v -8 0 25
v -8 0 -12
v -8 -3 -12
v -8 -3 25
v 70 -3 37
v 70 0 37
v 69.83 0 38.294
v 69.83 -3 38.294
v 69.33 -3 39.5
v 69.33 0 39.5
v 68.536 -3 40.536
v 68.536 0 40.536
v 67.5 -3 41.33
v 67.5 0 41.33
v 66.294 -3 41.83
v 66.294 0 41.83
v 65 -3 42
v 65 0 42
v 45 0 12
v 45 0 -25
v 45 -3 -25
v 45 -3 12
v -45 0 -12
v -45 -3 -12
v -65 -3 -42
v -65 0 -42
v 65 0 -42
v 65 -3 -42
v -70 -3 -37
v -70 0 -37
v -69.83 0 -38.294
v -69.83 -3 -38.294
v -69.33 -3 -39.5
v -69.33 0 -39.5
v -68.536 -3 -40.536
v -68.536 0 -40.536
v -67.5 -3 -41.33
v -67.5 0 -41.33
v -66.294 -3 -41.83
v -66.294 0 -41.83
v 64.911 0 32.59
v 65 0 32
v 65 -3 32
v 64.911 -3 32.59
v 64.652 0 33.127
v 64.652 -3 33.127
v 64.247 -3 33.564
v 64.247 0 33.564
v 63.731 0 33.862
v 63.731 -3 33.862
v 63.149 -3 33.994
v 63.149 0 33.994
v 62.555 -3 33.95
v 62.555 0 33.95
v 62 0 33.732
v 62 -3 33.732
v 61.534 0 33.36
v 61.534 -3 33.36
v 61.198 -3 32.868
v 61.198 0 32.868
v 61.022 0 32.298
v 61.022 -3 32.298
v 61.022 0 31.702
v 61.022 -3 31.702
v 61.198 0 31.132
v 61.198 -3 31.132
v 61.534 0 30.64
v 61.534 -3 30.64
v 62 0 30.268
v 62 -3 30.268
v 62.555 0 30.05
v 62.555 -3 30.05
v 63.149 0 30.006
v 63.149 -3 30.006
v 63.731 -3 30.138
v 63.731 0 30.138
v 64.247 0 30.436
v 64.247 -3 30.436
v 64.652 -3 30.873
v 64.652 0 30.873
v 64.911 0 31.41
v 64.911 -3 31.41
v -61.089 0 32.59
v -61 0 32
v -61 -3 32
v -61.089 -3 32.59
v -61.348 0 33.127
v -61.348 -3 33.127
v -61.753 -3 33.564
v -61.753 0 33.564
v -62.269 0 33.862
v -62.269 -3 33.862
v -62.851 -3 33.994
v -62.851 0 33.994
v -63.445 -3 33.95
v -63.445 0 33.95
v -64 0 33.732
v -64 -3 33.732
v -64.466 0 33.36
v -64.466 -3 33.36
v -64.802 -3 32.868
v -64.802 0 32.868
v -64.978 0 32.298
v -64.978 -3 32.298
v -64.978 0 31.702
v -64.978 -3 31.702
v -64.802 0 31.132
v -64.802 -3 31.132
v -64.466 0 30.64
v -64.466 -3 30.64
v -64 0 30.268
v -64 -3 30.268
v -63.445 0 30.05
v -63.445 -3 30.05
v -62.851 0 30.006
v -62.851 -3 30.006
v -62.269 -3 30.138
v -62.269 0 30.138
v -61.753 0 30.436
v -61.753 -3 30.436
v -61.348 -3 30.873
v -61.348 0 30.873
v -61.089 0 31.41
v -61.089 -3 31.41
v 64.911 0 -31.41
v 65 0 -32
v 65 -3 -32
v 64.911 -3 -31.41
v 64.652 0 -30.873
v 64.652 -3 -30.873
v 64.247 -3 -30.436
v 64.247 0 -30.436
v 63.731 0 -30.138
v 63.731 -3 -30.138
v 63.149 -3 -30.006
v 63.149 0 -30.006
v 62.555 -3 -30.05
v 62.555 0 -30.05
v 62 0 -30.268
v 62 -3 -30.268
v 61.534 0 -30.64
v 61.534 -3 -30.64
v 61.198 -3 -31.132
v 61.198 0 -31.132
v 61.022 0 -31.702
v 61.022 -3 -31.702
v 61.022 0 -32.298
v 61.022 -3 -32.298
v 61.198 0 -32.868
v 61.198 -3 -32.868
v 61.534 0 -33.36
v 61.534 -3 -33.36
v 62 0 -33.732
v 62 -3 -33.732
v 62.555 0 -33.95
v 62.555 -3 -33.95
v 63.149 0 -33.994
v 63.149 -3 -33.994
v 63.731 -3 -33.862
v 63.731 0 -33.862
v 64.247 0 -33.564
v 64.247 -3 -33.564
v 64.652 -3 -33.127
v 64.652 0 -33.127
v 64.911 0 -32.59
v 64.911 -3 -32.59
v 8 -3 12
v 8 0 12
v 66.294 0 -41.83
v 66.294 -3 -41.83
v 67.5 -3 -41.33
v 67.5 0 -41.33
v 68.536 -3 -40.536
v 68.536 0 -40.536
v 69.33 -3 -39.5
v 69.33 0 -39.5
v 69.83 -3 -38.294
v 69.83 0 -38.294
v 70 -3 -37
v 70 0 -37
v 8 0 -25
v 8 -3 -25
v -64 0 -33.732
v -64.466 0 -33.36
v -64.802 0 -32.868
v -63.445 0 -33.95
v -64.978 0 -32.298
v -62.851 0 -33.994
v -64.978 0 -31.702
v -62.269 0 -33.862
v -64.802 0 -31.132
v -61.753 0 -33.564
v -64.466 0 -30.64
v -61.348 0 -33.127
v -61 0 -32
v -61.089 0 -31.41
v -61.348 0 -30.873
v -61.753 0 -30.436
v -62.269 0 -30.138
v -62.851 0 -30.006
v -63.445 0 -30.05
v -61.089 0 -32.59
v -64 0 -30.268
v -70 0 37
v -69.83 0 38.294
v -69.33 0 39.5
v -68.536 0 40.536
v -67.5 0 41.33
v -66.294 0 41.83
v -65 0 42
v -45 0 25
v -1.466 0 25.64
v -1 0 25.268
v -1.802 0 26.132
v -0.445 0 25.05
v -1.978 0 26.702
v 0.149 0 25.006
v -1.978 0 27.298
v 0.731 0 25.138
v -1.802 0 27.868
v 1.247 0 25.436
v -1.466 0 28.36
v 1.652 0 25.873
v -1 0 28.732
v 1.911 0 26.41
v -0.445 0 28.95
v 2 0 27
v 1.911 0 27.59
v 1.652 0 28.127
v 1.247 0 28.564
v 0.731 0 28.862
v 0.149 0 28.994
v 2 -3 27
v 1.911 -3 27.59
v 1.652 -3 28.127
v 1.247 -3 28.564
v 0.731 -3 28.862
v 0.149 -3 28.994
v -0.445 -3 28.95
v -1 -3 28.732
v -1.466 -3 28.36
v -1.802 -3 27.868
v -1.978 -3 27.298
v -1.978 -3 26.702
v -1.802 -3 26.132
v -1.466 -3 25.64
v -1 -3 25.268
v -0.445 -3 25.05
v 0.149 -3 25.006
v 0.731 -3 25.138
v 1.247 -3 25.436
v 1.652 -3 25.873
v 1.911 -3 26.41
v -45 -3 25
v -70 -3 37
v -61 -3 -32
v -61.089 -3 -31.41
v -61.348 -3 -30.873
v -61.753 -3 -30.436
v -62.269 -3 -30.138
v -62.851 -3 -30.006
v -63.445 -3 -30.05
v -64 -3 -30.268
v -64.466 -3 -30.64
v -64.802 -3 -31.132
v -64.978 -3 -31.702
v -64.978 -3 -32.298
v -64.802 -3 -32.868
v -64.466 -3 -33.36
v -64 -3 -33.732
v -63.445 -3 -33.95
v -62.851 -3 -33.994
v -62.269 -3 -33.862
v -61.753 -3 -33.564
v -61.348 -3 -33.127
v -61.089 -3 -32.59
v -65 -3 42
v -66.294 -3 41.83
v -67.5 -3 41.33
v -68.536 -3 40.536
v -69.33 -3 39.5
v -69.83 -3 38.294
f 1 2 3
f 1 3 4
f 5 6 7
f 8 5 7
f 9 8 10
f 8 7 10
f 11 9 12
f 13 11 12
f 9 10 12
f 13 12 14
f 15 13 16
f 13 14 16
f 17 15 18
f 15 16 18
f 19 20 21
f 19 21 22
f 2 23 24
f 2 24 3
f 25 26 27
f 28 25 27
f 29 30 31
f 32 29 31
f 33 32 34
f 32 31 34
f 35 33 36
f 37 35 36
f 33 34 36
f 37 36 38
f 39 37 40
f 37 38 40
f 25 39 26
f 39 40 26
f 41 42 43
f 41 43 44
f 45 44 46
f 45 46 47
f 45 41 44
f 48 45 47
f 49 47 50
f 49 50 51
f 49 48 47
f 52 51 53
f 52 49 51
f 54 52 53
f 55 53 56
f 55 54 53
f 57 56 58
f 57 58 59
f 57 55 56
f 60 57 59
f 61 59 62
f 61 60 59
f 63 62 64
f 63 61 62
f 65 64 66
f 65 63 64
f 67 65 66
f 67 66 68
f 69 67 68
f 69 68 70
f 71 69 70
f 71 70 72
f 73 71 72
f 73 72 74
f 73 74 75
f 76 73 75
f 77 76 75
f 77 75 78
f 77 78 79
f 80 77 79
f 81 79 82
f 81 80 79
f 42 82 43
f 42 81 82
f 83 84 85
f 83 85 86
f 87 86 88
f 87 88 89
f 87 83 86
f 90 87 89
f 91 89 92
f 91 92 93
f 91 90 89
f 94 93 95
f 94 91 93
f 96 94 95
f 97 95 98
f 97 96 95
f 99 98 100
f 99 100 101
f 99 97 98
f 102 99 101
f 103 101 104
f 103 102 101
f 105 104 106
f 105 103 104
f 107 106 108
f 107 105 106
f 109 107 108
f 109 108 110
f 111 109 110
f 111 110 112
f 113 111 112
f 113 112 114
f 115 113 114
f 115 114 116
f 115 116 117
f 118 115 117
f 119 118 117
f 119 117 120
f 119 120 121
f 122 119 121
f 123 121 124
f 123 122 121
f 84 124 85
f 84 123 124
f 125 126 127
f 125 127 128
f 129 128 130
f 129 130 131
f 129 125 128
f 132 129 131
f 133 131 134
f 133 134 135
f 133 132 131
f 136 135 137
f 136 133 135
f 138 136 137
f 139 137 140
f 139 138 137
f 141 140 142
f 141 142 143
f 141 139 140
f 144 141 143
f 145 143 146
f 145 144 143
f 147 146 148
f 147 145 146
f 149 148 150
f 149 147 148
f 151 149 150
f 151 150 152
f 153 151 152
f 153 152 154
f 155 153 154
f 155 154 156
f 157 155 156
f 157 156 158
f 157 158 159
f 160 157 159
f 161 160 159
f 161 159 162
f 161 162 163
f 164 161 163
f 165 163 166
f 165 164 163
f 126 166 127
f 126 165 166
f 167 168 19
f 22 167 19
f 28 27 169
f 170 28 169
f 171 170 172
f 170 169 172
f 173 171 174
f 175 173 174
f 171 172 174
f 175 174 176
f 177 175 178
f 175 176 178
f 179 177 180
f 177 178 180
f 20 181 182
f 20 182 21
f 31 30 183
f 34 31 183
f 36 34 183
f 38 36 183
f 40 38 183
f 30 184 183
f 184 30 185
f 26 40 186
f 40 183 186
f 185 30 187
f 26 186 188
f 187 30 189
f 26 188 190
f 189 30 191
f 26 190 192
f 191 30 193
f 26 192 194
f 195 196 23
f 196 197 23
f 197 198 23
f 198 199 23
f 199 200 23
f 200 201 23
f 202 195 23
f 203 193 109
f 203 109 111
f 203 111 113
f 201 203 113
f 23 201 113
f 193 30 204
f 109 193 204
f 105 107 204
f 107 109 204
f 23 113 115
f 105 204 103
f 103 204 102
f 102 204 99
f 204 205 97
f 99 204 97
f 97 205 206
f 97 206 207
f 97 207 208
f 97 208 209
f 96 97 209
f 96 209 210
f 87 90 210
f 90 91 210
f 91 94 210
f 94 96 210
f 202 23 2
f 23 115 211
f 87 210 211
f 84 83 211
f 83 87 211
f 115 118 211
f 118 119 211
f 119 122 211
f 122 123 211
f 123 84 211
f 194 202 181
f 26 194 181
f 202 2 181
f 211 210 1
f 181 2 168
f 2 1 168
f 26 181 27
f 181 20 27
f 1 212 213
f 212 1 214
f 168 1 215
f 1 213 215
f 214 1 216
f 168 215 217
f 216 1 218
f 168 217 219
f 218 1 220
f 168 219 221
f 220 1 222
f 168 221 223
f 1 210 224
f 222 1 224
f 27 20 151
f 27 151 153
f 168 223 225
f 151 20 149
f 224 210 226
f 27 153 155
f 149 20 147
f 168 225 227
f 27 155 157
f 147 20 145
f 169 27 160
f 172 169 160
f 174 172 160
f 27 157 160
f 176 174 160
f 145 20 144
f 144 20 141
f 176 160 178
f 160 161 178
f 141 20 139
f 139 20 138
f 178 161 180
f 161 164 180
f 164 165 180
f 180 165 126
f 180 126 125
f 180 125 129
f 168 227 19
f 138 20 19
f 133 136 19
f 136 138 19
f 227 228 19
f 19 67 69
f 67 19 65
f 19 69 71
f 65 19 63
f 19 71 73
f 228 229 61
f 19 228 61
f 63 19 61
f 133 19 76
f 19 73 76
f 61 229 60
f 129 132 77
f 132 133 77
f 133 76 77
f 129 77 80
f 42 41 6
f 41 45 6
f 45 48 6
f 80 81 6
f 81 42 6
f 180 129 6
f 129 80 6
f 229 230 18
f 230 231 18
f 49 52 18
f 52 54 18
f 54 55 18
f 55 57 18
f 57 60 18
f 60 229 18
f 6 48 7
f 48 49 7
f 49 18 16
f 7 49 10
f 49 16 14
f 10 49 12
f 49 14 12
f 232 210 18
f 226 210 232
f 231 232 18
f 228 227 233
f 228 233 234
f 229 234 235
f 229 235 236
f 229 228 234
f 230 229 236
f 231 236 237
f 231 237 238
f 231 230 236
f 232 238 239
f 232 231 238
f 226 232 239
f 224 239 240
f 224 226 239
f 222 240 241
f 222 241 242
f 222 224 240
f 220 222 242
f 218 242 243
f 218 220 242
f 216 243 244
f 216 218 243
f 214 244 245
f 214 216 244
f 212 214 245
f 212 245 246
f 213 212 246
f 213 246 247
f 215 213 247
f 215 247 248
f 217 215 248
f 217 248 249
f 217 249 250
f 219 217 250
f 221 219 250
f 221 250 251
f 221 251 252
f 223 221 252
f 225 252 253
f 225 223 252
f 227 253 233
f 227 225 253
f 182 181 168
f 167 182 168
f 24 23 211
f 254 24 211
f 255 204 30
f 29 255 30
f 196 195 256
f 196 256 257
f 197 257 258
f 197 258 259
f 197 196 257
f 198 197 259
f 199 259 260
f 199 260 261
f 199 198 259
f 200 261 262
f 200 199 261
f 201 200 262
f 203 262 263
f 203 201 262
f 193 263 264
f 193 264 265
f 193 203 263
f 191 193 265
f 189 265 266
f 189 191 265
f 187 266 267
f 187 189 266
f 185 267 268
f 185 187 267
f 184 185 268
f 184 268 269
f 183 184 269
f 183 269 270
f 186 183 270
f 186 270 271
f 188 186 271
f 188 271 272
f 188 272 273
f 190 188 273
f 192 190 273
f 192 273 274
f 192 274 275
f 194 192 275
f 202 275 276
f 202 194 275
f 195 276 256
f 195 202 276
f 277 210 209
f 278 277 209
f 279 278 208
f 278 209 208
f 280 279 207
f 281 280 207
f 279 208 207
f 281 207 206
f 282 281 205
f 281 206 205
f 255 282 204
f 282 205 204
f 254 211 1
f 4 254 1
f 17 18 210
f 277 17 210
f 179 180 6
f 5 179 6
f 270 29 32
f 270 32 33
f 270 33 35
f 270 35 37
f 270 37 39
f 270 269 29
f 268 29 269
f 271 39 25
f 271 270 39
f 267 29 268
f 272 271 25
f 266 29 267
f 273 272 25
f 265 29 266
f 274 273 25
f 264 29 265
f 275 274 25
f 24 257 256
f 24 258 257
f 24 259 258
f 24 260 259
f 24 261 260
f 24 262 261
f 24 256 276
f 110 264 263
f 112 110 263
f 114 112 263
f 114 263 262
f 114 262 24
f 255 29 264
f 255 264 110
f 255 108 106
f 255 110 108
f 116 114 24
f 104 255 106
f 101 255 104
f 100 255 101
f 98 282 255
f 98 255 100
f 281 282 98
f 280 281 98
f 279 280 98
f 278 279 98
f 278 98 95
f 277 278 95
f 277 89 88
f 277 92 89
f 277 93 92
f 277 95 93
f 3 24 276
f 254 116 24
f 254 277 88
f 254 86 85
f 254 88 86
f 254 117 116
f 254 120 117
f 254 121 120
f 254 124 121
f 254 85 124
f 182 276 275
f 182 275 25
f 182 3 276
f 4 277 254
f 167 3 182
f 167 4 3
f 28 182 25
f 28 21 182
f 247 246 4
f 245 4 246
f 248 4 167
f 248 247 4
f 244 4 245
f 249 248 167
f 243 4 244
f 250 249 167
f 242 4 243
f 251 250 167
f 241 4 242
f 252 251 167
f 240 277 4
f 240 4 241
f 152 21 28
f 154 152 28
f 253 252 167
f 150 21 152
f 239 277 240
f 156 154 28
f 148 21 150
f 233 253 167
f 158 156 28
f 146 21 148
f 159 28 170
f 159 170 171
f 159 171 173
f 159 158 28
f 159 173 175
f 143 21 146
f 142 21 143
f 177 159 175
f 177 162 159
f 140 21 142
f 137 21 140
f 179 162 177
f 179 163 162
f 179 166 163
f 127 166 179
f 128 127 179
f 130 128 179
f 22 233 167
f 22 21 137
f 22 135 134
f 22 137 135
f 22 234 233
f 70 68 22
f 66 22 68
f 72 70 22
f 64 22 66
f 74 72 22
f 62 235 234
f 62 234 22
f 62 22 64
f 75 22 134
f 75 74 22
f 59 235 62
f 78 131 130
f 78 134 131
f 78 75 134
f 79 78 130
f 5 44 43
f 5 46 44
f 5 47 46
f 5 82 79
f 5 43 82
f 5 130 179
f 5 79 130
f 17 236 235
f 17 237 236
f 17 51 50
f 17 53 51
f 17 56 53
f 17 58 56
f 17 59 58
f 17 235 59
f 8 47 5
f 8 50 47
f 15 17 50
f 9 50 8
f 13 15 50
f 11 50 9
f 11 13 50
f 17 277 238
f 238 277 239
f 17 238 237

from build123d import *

# Parameters (mm, degrees)
F0_R     = 2
F0_W     = 37
F0_H     = 37
F1_DEPTH = 3


with BuildPart() as f1:
    # F0 (on Front) → F1 (new body)
    with BuildSketch(Plane.XZ):
        with BuildLine():
            Line((65, 42), (-65, 42))
            ThreePointArc((-65, 42), (-68.535534, 40.535534), (-70, 37))
            Line((-70, 37), (-70, -37))
            ThreePointArc((-70, -37), (-68.535534, -40.535534), (-65, -42))
            Line((-65, -42), (65, -42))
            ThreePointArc((65, -42), (68.535534, -40.535534), (70, -37))
            Line((70, -37), (70, 37))
            ThreePointArc((70, 37), (68.535534, 40.535534), (65, 42))
        make_face()
        with Locations((-63, -32)):
            Circle(F0_R, mode=Mode.SUBTRACT)
        with Locations((63, -32)):
            Circle(F0_R, mode=Mode.SUBTRACT)
        with Locations((26.5, -6.5)):
            Rectangle(F0_W, F0_H, mode=Mode.SUBTRACT)
        with Locations((-26.5, 6.5)):
            Rectangle(F0_W, F0_H, mode=Mode.SUBTRACT)
        with Locations((-63, 32)):
            Circle(F0_R, mode=Mode.SUBTRACT)
        with Locations((0, 27)):
            Circle(F0_R, mode=Mode.SUBTRACT)
        with Locations((63, 32)):
            Circle(F0_R, mode=Mode.SUBTRACT)
    extrude(amount=F1_DEPTH)


solid = f1.part
